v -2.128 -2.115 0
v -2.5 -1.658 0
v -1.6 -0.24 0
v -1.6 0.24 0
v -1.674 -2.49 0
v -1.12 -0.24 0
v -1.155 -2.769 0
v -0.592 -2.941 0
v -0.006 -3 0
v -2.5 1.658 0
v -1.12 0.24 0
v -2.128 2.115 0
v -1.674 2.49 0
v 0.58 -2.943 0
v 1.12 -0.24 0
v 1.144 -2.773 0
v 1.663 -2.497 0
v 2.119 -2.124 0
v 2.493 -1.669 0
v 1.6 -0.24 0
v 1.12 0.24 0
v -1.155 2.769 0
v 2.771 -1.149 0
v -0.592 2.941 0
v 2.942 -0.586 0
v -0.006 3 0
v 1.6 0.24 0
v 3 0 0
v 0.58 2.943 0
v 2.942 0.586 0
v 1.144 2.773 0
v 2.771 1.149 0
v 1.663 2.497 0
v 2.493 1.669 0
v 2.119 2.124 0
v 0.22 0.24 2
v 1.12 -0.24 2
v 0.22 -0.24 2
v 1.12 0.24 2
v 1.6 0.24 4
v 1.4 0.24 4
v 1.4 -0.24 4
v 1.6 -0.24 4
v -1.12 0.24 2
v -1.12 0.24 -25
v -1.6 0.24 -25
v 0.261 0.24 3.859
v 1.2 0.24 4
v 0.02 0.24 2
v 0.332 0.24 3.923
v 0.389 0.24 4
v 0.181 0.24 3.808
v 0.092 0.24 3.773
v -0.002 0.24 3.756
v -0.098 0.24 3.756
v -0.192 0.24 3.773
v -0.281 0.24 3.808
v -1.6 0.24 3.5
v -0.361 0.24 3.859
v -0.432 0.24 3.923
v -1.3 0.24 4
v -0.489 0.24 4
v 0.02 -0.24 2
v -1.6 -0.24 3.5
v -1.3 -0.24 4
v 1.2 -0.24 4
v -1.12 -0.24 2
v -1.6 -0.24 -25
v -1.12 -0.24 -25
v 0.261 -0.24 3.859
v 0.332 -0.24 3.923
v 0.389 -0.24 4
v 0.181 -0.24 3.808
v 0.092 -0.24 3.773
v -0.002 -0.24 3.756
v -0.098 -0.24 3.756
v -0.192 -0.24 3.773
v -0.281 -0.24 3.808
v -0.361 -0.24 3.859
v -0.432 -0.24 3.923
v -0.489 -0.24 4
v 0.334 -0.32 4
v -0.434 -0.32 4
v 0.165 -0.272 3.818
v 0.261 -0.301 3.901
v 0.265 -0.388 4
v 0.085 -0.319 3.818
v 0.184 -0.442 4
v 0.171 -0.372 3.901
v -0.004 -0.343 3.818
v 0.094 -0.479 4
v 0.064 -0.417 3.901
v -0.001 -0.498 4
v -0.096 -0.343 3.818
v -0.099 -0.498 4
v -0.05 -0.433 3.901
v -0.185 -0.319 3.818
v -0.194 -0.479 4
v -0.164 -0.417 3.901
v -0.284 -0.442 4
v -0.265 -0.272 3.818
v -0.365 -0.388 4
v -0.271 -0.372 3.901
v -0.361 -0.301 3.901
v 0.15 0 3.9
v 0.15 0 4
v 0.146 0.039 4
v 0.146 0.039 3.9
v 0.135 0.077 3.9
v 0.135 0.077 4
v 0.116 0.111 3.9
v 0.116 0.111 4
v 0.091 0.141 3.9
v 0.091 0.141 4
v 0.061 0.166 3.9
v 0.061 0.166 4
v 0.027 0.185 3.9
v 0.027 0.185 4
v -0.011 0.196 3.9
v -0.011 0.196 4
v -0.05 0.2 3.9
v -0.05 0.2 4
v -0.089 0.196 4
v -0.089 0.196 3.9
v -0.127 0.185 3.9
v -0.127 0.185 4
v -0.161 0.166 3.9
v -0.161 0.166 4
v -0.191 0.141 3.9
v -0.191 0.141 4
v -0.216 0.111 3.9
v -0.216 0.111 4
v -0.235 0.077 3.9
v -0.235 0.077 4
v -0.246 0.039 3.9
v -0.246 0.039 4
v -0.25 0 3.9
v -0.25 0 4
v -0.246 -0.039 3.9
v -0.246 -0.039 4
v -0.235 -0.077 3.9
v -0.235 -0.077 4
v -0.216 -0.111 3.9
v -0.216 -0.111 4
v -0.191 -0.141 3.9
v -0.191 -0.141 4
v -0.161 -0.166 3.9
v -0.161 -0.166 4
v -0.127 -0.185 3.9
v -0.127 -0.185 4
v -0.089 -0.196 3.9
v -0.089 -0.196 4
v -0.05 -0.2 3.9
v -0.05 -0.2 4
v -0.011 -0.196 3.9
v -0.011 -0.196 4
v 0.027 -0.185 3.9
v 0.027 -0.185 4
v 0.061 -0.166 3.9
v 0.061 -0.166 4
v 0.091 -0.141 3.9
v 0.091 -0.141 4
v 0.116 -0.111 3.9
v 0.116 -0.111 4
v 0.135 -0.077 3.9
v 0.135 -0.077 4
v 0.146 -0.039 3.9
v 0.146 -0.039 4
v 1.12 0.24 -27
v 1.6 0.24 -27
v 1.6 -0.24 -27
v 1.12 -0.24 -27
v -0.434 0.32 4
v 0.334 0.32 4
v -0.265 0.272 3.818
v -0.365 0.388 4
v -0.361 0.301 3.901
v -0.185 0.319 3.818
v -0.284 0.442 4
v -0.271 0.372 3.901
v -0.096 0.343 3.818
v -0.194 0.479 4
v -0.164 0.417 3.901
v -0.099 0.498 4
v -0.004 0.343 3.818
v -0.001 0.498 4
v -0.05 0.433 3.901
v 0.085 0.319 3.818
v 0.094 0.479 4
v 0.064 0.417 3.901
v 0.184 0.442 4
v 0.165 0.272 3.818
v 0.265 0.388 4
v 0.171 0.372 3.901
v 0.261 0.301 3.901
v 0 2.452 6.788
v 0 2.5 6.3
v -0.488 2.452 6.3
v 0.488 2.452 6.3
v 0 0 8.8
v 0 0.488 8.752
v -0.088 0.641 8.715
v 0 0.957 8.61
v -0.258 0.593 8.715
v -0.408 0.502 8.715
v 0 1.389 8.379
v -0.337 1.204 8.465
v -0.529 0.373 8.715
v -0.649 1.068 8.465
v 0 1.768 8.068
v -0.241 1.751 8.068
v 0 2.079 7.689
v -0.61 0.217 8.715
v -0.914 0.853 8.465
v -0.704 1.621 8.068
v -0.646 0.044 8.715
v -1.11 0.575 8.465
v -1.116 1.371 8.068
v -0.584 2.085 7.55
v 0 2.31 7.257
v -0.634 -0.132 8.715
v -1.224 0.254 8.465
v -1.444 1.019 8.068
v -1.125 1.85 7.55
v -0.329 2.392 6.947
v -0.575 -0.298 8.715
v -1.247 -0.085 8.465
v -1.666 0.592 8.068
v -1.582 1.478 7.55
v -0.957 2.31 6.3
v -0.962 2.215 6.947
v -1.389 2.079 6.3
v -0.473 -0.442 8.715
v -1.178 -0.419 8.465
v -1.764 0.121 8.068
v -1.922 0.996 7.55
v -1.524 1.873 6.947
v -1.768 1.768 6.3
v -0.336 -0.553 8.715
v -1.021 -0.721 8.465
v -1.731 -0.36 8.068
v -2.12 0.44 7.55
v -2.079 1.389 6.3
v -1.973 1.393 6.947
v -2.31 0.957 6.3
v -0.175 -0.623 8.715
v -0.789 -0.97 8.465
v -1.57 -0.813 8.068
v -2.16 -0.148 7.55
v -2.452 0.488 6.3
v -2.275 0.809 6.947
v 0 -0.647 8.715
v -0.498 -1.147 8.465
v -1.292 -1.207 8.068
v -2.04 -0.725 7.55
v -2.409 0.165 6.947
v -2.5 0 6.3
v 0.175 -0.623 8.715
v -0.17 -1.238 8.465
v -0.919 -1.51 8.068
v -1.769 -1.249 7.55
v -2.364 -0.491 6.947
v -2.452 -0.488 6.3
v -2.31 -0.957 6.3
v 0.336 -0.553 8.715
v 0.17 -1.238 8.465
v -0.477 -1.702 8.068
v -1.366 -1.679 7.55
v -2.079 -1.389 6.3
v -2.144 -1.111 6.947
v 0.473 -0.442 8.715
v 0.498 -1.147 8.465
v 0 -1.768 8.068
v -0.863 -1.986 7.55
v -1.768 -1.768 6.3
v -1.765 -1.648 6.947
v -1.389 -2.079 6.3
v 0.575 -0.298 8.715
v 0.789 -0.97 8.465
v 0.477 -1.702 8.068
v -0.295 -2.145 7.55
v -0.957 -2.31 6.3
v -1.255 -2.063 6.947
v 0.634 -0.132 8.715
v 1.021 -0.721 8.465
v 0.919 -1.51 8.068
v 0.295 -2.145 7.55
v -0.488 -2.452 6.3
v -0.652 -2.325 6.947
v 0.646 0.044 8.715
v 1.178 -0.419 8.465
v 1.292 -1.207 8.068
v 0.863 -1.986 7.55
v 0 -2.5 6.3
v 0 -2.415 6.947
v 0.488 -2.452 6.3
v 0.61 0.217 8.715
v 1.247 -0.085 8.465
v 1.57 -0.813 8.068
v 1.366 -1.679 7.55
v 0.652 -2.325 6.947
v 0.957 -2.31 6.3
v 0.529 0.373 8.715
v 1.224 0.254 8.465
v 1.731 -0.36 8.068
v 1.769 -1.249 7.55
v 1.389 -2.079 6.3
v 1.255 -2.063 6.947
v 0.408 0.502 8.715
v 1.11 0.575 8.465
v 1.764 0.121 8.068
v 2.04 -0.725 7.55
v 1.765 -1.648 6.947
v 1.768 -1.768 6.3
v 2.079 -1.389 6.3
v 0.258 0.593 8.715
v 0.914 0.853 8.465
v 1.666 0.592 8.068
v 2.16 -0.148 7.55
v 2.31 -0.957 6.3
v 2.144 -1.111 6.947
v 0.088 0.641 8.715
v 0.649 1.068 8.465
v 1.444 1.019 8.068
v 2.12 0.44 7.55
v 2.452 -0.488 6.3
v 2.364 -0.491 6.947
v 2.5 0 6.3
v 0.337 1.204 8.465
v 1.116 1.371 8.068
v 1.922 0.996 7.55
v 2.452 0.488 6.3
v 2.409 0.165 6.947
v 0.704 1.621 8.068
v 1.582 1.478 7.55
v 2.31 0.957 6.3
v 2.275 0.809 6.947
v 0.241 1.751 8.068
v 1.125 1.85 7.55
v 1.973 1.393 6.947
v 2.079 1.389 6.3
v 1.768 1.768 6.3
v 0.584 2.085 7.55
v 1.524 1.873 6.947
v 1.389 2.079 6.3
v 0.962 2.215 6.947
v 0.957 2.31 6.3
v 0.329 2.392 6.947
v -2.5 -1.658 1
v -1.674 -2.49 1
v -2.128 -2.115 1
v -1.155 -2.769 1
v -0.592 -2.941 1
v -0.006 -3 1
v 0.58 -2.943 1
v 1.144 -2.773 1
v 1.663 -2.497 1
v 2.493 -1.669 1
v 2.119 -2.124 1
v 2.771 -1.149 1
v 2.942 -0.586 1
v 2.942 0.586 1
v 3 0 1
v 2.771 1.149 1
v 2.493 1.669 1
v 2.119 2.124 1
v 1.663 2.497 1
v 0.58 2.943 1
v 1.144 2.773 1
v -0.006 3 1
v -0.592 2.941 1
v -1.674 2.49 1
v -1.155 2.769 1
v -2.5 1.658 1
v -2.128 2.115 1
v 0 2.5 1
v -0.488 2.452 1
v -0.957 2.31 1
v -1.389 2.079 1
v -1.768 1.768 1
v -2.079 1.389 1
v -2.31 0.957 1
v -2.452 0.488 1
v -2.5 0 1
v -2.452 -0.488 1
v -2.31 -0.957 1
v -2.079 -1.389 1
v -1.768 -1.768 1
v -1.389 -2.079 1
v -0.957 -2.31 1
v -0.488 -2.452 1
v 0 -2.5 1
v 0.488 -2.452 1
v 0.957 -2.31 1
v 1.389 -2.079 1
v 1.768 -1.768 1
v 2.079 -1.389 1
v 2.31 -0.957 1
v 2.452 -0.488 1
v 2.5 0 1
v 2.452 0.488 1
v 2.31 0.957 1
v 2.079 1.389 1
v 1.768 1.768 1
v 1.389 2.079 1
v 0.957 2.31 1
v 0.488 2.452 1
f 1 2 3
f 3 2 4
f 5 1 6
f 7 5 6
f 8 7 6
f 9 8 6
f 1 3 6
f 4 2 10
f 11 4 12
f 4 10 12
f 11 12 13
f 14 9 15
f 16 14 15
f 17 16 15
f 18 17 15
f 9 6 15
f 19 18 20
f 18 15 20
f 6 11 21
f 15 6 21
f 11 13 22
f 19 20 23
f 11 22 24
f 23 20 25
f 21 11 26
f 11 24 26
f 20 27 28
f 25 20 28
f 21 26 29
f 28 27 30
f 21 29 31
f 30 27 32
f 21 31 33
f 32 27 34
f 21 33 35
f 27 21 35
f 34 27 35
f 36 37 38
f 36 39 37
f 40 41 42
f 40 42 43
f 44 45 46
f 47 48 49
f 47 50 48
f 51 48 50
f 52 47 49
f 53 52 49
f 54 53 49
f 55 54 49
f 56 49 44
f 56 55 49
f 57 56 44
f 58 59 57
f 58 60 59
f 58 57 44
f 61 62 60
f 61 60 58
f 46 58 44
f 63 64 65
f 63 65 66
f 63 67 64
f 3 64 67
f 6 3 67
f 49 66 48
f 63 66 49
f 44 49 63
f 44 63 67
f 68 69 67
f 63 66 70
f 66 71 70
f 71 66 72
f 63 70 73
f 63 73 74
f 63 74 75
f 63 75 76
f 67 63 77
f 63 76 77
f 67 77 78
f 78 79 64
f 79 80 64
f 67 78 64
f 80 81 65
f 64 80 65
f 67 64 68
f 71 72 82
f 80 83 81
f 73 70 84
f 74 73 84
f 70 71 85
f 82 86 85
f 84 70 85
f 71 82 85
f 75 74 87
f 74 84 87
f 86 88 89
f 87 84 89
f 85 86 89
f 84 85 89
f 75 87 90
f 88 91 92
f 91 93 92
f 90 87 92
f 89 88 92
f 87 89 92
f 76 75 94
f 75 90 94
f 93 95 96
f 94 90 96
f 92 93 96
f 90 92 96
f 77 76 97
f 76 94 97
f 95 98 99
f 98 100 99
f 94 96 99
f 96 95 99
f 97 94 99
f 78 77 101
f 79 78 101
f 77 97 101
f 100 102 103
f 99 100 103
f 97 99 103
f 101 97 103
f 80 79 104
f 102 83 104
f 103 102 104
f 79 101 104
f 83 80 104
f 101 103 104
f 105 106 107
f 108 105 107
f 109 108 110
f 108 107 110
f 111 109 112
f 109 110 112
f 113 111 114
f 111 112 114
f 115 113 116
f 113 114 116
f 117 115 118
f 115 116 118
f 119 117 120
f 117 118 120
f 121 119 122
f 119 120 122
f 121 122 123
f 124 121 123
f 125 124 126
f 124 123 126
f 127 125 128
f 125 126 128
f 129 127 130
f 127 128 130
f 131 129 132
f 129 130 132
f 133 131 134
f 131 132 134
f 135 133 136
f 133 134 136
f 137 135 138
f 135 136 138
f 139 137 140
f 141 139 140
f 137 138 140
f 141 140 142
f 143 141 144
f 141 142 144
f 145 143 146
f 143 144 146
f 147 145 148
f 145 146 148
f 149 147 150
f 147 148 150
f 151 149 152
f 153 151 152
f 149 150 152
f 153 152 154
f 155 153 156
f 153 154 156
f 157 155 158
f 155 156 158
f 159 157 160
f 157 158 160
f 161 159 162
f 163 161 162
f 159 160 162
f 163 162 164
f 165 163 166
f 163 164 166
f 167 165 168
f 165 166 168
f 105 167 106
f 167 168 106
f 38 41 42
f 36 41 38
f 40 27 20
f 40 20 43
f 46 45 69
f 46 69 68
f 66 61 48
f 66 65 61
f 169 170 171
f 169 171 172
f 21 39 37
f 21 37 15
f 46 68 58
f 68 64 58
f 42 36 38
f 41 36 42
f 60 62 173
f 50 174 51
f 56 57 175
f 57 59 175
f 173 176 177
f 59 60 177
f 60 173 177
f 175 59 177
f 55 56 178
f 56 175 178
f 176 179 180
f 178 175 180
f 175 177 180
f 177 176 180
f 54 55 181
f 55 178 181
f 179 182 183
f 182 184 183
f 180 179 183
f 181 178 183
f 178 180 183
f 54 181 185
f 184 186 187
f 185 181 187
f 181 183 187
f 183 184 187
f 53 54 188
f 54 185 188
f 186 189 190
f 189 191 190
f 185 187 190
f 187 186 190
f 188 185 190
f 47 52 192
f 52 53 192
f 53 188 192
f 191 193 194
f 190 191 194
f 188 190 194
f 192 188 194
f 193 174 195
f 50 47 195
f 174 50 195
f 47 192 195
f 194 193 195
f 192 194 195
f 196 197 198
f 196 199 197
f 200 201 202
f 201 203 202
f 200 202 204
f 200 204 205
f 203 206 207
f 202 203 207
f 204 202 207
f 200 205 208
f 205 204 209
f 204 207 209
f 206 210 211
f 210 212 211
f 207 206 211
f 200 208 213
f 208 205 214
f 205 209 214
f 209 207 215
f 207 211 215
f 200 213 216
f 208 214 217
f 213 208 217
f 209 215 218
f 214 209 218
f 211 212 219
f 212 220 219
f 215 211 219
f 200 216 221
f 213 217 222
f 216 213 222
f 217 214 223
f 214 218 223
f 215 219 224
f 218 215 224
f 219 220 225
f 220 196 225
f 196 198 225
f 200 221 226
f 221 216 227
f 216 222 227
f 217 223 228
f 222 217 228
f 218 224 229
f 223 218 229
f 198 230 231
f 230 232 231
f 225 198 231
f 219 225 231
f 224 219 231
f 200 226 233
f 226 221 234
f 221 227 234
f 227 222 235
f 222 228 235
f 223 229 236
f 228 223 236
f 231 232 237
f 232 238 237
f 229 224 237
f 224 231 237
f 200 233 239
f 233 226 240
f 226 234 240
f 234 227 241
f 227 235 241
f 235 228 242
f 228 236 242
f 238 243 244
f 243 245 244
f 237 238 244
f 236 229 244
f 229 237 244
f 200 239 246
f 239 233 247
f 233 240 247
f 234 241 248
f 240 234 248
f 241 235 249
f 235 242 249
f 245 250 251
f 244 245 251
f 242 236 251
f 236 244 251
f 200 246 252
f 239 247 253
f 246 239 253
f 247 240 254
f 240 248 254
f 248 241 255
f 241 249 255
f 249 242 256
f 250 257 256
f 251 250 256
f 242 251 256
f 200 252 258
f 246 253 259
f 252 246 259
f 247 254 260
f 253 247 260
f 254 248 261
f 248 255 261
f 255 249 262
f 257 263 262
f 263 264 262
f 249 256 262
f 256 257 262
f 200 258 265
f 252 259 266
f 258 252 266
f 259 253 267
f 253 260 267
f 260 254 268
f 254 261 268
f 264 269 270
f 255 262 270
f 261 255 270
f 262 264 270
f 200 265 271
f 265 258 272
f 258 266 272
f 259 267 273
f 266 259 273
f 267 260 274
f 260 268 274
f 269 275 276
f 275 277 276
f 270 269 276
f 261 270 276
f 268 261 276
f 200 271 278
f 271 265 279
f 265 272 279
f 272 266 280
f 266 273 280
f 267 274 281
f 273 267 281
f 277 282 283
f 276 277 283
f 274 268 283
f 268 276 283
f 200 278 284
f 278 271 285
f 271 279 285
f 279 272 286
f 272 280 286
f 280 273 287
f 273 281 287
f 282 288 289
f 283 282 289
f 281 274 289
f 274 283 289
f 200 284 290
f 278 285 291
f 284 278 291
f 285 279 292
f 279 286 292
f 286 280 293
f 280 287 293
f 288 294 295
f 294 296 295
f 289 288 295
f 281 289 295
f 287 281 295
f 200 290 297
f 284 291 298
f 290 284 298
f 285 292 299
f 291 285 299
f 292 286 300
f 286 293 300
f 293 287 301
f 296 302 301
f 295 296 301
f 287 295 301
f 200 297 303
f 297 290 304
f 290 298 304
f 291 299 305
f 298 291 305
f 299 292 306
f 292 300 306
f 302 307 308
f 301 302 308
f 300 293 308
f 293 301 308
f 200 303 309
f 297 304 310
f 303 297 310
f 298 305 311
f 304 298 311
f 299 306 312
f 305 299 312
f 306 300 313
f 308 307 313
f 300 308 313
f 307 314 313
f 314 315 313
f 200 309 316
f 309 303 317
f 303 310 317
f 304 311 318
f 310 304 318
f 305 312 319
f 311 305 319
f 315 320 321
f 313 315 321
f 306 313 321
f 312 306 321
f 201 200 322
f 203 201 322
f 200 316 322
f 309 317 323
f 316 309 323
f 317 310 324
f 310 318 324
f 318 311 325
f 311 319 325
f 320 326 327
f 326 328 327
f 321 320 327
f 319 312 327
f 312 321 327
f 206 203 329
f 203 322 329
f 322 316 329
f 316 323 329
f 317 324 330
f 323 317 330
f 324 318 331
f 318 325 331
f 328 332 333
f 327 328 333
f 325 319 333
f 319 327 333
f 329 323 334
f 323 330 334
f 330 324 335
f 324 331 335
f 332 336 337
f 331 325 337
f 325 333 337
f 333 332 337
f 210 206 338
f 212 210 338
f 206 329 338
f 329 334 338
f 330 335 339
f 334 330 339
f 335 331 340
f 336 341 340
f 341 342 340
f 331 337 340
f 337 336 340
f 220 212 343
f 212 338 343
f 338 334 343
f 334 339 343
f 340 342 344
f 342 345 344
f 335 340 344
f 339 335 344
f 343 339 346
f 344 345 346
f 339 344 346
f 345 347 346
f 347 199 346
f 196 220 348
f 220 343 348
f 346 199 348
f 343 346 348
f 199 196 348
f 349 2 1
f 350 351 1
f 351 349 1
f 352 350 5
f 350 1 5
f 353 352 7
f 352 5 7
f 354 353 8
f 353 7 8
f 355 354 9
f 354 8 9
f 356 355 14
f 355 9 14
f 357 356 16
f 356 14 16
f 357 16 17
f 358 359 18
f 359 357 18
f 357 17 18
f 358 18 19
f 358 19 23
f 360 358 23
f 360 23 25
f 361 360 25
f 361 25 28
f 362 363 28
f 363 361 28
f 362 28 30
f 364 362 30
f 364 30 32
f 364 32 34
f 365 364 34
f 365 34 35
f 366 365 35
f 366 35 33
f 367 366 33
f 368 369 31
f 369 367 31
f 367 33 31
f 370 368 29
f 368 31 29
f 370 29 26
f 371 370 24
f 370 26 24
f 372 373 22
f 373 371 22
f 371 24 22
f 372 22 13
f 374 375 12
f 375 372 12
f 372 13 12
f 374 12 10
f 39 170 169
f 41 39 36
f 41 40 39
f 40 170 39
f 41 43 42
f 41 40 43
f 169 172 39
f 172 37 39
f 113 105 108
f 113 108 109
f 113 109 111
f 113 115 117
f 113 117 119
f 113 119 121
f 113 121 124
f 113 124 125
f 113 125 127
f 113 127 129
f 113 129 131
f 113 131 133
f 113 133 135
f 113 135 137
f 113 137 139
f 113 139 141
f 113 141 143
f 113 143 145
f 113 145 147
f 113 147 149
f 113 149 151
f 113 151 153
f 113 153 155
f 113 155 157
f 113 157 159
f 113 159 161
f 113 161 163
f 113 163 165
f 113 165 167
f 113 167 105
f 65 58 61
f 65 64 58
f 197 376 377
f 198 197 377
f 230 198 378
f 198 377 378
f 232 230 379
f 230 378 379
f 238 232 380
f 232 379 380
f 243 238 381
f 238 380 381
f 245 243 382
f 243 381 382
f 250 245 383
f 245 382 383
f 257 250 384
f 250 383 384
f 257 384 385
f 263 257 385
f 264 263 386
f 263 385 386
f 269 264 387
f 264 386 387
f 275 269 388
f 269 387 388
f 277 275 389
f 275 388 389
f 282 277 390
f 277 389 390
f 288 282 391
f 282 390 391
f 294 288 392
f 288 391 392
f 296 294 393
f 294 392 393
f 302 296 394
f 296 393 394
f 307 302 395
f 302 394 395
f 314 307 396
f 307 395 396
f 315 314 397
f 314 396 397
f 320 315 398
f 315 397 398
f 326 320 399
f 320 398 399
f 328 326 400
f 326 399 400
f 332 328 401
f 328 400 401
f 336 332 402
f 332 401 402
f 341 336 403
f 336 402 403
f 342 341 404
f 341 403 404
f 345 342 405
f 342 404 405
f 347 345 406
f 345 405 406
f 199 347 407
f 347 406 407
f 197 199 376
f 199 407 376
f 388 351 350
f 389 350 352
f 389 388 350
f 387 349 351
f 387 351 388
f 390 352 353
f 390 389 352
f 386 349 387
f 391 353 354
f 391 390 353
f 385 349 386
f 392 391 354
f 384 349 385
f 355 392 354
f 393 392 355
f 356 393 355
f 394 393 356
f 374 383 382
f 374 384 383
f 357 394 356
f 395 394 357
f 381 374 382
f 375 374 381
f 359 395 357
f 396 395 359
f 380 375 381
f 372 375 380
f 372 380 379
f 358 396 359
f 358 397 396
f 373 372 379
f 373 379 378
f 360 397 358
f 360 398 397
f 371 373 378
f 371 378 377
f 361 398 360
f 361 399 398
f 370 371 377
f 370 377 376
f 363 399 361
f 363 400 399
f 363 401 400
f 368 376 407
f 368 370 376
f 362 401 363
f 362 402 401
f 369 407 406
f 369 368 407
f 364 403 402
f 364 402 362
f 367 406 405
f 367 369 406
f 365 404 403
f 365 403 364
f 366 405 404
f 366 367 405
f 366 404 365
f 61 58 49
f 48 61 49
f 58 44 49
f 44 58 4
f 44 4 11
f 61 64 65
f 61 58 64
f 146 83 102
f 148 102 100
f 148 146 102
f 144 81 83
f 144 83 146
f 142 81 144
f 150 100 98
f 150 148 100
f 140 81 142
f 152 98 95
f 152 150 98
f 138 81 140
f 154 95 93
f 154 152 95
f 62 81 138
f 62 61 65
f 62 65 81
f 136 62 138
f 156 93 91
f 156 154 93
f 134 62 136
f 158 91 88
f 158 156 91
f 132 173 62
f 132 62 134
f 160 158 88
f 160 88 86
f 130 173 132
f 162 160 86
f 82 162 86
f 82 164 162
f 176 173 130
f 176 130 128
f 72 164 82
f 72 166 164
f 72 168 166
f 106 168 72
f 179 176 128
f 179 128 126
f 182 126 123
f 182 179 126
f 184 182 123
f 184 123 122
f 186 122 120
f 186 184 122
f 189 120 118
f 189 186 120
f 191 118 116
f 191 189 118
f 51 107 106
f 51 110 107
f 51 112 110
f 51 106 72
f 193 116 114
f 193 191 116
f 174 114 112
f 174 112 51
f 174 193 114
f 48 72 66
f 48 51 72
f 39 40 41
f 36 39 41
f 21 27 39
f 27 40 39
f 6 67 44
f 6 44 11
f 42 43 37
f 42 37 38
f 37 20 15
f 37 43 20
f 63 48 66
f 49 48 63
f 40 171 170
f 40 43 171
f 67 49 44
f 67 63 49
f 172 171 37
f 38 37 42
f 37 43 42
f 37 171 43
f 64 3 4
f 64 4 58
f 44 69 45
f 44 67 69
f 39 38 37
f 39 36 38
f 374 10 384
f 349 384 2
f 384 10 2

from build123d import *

# Parameters (mm, degrees)
ESBO_O1_R                  = 3
RESSALTO_EXTRUS_O1_DEPTH   = 1
CORTE_EXTRUS_O1_DEPTH      = 1
ESBO_O5_W                  = 0.48
ESBO_O5_H                  = 0.48
RESSALTO_EXTRUS_O2_DEPTH   = 25
RESSALTO_EXTRUS_O2_2_DEPTH = 25
ESBO_O6_W                  = 0.48
ESBO_O6_H                  = 0.48
RESSALTO_EXTRUS_O3_DEPTH   = 2
CORTE_EXTRUS_O2_DEPTH      = 0.24
RESSALTO_EXTRUS_O4_DEPTH   = 0.24
RESSALTO_EXTRUS_O4_2_DEPTH = 0.24
ESBO_O12_R                 = 0.2
CORTE_EXTRUS_O3_DEPTH      = 0.1


with BuildPart() as part:
    # Esboço1 → Ressalto-extrusão1 (new body)
    with BuildSketch(Plane.XY):
        Circle(ESBO_O1_R)
    extrude(amount=RESSALTO_EXTRUS_O1_DEPTH)

    # Esboço3 → Revolução1 (revolve)
    with BuildSketch(Plane(origin=(0, 0, 0), x_dir=(0, 0, -1), z_dir=(1, 0, 0))):
        with BuildLine():
            Line((-1, 0), (-8.8, 0))
            ThreePointArc((-8.8, 0), (-8.067766953, 1.767766953), (-6.3, 2.5))
            Line((-6.3, 2.5), (-1, 2.5))
            Line((-1, 2.5), (-1, 0))
        make_face()
    revolve(axis=Axis((0, 0, 1), (0, 0, 1)))

    # Esboço4 → Corte-extrusão1 (cut)
    with BuildSketch(Plane(origin=(0, 0, 0), x_dir=(-1, 0, 0), z_dir=(0, 0, -1))):
        with BuildLine():
            Line((2.5, 1.658312395), (2.5, -1.658312395))
            ThreePointArc((2.5, -1.658312395), (3, 0), (2.5, 1.658312395))
        make_face()
    extrude(amount=-CORTE_EXTRUS_O1_DEPTH, mode=Mode.SUBTRACT)

    # Esboço7 → Corte-extrusão2 (cut, symmetric)
    with BuildSketch(Plane(origin=(0, 0, 0), x_dir=(1, 0, 0), z_dir=(0, 1, 0))):
        Polygon((-1.6, 0), (-1.6, -3.5), (-1.3, -4), (1.2, -4), (0.02, -2), (-1.12, -2), (-1.12, 0), align=None)
        Polygon((1.6, 0), (1.6, -4), (1.4, -4), (0.22, -2), (1.12, -2), (1.12, 0), align=None)
    extrude(amount=CORTE_EXTRUS_O2_DEPTH, both=True, mode=Mode.SUBTRACT)


with BuildPart() as body_2:
    # Esboço5 → Ressalto-extrusão2 (new body)
    with BuildSketch(Plane(origin=(0, 0, 0), x_dir=(-1, 0, 0), z_dir=(0, 0, -1))):
        with Locations((-1.36, 0)):
            Rectangle(ESBO_O5_W, ESBO_O5_H)
    extrude(amount=RESSALTO_EXTRUS_O2_DEPTH)


with BuildPart() as body_3:
    # Esboço5 → Ressalto-extrus_o2 2 (new body)
    with BuildSketch(Plane(origin=(0, 0, 0), x_dir=(-1, 0, 0), z_dir=(0, 0, -1))):
        with Locations((1.36, 0)):
            Rectangle(ESBO_O5_W, ESBO_O5_H)
    extrude(amount=RESSALTO_EXTRUS_O2_2_DEPTH)


with BuildPart() as body_4:
    # Esboço6 → Ressalto-extrusão3 (new body)
    with BuildSketch(Plane(origin=(0, 0, -25), x_dir=(-1, 0, 0), z_dir=(0, 0, -1))):
        with Locations((-1.36, 0)):
            Rectangle(ESBO_O6_W, ESBO_O6_H)
    extrude(amount=RESSALTO_EXTRUS_O3_DEPTH)


with BuildPart() as body_5:
    # Esboço8 → Ressalto-extrusão4 (new body, symmetric)
    with BuildSketch(Plane(origin=(0, 0, 0), x_dir=(1, 0, 0), z_dir=(0, 1, 0))):
        Polygon((-1.3, -4), (1.2, -4), (0.02, -2), (-1.12, -2), (-1.12, 0), (-1.6, 0), (-1.6, -3.5), align=None)
    extrude(amount=RESSALTO_EXTRUS_O4_DEPTH, both=True)

    # Combinar2: union body 3
    add(body_3.part)

    # Esboço10 → Corte-Revolução1 (revolve, cut)
    with BuildSketch(Plane(origin=(0, 0, 0), x_dir=(1, 0, 0), z_dir=(0, 1, 0))):
        with BuildLine():
            Line((-0.05, -4), (-0.05, -3.7))
            ThreePointArc((-0.05, -3.7), (-0.341547595, -3.780754009), (-0.55, -4))
            Line((-0.55, -4), (-0.05, -4))
        make_face()
    revolve(axis=Axis((-0.05, 0, 4), (0, 0, -1)), mode=Mode.SUBTRACT)


with BuildPart() as body_6:
    # Esboço8 → Ressalto-extrus_o4 2 (new body, symmetric)
    with BuildSketch(Plane(origin=(0, 0, 0), x_dir=(1, 0, 0), z_dir=(0, 1, 0))):
        Polygon((0.22, -2), (1.4, -4), (1.6, -4), (1.6, 0), (1.12, 0), (1.12, -2), align=None)
    extrude(amount=RESSALTO_EXTRUS_O4_2_DEPTH, both=True)

    # Combinar1: union body 4, body 2
    add(body_4.part)
    add(body_2.part)


with BuildPart() as body_4_2:
    # Esboço11 → Revolução2 (revolve)
    with BuildSketch(Plane(origin=(0, 0, 0), x_dir=(1, 0, 0), z_dir=(0, 1, 0))):
        with BuildLine():
            Line((-0.55, -4), (-0.05, -4))
            Line((-0.05, -4), (-0.05, -3.7))
            ThreePointArc((-0.05, -3.7), (-0.341547595, -3.780754009), (-0.55, -4))
        make_face()
    revolve(axis=Axis((-0.05, 0, 4), (0, 0, -1)))

    # Combinar3: union body 5
    add(body_5.part)

    # Esboço12 → Corte-extrusão3 (cut)
    with BuildSketch(Plane.XY.offset(4)):
        with Locations((-0.05, 0)):
            Circle(ESBO_O12_R)
    extrude(amount=-CORTE_EXTRUS_O3_DEPTH, mode=Mode.SUBTRACT)


solid = Compound([part.part, body_6.part, body_4_2.part])
